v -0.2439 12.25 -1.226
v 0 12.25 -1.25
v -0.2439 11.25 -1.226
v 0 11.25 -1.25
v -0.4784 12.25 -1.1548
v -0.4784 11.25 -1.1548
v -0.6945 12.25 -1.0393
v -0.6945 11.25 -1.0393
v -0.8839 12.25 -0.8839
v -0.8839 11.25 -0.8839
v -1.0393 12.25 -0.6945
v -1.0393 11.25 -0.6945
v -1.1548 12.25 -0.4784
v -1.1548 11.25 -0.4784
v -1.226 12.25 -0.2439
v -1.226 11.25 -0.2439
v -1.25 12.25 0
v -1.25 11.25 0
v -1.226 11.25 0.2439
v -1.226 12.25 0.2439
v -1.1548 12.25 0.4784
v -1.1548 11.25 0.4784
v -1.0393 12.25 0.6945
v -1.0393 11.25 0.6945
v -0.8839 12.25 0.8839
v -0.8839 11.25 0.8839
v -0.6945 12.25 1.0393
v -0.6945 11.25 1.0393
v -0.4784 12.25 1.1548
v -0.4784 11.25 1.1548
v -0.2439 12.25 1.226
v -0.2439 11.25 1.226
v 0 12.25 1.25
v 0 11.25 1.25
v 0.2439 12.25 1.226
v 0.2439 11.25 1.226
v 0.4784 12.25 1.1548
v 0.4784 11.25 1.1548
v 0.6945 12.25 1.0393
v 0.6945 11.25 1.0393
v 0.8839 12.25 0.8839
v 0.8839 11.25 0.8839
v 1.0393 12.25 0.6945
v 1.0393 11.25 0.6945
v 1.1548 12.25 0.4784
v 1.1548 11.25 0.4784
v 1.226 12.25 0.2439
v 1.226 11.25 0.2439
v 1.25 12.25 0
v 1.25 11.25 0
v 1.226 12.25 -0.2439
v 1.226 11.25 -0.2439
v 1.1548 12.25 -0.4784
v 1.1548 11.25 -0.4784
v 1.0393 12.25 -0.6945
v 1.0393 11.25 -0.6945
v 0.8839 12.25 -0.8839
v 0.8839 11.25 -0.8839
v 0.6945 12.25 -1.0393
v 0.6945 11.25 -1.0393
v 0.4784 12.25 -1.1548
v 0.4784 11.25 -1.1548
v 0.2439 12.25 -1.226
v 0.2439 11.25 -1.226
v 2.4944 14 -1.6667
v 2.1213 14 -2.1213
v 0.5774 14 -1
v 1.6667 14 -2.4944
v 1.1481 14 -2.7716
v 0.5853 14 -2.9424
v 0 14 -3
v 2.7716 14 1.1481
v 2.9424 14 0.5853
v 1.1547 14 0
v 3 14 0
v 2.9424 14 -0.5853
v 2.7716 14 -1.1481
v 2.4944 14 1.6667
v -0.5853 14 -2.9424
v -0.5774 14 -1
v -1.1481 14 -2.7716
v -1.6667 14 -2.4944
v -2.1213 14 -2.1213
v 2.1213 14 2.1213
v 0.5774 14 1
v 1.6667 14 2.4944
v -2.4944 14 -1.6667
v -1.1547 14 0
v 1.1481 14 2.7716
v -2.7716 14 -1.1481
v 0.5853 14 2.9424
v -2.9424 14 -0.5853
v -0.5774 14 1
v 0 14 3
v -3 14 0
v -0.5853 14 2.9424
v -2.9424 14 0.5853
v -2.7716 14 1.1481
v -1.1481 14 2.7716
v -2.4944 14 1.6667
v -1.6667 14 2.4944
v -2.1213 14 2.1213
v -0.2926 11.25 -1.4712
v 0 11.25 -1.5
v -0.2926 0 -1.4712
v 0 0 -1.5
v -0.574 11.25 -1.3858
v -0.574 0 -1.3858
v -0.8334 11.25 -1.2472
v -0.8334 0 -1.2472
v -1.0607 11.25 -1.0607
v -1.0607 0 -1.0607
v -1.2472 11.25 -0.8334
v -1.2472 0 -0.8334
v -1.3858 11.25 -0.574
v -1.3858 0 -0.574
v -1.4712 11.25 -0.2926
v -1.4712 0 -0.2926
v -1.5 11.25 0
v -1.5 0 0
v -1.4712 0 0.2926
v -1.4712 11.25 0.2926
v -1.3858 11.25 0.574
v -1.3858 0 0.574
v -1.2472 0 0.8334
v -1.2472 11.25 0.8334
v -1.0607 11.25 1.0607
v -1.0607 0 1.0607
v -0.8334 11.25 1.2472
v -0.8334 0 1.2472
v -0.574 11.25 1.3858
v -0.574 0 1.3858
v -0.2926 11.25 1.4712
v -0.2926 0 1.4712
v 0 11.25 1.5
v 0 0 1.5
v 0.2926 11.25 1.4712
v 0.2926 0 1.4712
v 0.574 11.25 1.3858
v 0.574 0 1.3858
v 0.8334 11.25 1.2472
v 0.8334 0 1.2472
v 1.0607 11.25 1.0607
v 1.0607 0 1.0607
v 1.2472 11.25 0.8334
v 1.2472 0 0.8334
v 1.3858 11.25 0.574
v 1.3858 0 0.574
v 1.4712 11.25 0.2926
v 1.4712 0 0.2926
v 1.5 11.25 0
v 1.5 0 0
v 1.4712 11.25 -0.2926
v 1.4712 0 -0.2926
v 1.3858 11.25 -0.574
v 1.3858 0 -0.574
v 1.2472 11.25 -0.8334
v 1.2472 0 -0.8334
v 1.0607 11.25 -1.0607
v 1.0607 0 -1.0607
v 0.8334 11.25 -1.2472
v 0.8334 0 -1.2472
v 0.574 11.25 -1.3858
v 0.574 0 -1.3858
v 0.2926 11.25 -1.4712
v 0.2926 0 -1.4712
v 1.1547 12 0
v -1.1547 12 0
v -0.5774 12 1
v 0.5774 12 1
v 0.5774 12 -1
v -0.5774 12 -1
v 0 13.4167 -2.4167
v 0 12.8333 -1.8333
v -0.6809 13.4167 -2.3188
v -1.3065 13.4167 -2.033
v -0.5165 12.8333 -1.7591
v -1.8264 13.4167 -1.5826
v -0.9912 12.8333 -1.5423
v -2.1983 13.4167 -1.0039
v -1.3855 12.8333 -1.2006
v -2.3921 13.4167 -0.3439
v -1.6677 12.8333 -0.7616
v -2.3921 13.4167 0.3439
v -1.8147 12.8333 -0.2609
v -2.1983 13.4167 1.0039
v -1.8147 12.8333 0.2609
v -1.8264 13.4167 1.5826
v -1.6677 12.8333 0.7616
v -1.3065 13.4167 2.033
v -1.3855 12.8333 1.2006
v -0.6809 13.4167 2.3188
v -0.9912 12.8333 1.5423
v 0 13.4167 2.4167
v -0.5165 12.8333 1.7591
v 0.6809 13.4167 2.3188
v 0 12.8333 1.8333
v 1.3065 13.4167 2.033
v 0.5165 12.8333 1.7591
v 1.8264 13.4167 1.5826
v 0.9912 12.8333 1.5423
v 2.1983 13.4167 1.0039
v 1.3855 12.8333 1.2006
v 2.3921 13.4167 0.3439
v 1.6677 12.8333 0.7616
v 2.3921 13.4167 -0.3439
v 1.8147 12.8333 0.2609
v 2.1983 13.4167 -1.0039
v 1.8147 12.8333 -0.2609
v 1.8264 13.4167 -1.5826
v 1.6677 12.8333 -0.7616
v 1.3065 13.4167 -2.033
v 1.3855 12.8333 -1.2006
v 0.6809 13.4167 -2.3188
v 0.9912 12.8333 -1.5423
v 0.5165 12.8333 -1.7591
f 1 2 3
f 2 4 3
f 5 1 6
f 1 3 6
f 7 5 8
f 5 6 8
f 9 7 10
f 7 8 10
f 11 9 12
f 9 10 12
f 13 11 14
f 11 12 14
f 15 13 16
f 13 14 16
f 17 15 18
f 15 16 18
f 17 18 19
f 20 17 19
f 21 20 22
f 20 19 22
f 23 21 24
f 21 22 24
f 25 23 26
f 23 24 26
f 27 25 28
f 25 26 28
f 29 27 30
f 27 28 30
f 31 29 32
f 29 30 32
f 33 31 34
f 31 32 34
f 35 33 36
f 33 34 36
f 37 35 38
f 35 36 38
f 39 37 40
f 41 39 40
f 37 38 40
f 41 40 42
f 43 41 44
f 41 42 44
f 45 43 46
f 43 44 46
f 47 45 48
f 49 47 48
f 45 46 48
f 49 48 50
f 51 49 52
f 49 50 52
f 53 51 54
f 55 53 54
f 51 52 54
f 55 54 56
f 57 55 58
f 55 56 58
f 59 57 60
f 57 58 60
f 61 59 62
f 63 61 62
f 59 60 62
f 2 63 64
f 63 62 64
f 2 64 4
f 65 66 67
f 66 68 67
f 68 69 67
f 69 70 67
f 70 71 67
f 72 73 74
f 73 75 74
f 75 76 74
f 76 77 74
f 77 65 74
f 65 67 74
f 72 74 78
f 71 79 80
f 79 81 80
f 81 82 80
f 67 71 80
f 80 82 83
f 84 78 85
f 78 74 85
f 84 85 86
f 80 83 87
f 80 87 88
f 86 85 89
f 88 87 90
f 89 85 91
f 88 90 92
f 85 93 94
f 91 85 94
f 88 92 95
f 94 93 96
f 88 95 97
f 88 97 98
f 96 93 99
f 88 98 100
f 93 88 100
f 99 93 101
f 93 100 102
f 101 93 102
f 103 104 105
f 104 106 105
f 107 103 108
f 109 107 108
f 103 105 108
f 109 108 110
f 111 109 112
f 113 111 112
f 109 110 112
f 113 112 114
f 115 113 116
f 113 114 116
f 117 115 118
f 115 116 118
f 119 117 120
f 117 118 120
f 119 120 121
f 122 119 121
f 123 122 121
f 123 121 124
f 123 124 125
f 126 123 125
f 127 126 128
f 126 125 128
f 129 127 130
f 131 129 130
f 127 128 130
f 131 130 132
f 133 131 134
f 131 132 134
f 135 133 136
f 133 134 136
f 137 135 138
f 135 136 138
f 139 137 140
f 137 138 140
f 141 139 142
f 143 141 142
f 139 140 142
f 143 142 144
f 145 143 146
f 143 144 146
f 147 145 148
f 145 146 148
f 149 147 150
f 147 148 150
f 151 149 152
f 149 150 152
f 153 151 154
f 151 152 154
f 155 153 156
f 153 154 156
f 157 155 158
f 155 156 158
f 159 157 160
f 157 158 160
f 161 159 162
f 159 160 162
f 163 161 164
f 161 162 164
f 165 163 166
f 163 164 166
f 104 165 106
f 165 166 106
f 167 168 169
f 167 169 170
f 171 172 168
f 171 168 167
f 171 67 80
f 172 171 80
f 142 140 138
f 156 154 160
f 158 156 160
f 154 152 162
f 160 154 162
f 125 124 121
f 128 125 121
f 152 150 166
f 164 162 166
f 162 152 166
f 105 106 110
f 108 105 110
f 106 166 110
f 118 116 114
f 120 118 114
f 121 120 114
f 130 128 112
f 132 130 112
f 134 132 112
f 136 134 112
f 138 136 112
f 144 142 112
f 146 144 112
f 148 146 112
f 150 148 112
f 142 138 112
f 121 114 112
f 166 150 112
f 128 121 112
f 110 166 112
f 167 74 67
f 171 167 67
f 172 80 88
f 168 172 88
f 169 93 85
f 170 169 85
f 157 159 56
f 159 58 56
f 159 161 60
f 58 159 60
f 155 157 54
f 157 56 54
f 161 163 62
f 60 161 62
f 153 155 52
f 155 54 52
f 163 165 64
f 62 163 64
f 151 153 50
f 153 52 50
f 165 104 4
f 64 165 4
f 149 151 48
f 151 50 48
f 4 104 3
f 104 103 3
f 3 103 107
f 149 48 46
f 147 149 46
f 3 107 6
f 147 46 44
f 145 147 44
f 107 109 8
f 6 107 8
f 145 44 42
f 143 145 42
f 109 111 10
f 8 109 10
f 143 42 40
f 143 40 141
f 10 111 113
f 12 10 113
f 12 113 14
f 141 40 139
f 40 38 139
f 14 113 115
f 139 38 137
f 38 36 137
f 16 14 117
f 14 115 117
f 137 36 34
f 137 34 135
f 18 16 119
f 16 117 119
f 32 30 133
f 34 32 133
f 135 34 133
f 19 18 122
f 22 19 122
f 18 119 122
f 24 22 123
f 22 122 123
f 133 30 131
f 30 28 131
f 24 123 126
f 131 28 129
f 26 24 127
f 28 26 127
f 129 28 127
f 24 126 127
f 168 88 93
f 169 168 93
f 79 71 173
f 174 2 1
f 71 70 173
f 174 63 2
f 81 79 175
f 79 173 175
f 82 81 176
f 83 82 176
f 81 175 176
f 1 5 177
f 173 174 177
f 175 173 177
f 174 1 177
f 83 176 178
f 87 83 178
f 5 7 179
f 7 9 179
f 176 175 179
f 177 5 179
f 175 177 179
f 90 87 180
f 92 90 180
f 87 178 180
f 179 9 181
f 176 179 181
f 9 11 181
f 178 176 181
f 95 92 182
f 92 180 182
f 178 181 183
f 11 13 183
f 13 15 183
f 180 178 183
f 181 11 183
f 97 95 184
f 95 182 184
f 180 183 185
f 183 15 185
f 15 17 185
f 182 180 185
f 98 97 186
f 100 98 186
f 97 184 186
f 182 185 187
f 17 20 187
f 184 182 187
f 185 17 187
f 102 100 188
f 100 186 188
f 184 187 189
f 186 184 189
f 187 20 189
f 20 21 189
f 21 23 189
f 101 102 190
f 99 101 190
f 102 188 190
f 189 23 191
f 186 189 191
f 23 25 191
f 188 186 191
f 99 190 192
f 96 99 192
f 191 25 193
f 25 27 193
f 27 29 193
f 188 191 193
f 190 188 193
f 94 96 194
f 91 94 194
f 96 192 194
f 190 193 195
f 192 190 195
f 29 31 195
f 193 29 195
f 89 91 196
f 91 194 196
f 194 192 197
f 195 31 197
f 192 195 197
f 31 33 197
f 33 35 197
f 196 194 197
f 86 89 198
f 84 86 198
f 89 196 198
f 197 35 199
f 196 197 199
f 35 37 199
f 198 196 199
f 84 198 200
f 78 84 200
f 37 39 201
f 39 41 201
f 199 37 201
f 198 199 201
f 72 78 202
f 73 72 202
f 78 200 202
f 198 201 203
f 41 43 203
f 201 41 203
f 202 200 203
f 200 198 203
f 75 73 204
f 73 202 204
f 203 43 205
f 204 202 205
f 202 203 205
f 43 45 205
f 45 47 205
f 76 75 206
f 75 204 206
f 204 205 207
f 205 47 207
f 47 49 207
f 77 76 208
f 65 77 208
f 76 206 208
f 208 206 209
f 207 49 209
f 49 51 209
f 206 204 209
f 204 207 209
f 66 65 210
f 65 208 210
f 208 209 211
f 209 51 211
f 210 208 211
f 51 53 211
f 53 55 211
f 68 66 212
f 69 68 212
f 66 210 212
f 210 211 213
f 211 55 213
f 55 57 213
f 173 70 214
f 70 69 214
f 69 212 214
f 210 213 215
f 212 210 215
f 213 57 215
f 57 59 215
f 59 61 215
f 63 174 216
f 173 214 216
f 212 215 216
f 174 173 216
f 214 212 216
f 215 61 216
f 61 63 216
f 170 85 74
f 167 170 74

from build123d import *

# Parameters (mm, degrees)
CUT_EXTRUDE_1_DEPTH = 2


with BuildPart() as part:
    # 草图1 → 旋转1 (revolve)
    with BuildSketch(Plane.XY, mode=Mode.PRIVATE) as revolve_1_sk:
        Polygon((0, 14), (-3, 14), (-1.25, 12.25), (-1.25, 11.25), (-1.5, 11.25), (-1.5, 0), (0, 0), align=None)
    revolve(revolve_1_sk.sketch.rotate(Axis((0, 0, 0), (0, 1, 0)), 270), axis=Axis((0, 0, 0), (0, 1, 0)))

    # 草图2 → 切除-拉伸1 (cut)
    with BuildSketch(Plane(origin=(0, 14, 0), x_dir=(1, 0, 0), z_dir=(0, 1, 0))):
        Polygon((0.577350269, 1), (-0.577350269, 1), (-1.154700538, 0), (-0.577350269, -1), (0.577350269, -1), (1.154700538, 0), align=None)
    extrude(amount=-CUT_EXTRUDE_1_DEPTH, mode=Mode.SUBTRACT)


solid = part.part
